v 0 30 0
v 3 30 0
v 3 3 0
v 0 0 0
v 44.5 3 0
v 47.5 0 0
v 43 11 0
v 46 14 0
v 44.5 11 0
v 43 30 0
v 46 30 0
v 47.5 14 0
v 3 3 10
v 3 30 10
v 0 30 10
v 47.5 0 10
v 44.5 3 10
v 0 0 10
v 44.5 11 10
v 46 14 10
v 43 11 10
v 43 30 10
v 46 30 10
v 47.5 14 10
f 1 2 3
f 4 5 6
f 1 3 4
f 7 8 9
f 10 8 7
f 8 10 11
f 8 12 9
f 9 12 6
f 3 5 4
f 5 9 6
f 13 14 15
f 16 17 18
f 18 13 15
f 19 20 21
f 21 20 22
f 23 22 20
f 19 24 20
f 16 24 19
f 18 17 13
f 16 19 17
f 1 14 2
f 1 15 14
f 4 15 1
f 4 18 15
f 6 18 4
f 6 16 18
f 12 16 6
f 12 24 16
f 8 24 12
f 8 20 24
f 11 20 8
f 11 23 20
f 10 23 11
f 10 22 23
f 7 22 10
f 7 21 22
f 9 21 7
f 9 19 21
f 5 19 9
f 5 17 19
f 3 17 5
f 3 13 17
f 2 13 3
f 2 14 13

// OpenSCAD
door_thickness = 40;
length = 30;
thickness = 3;
tie_thickness = 1.5;
tie_width = 8;

linear_extrude(10)
difference() {
    union() {
        square([thickness*2+door_thickness, length]);
        #translate([thickness+door_thickness+tie_thickness,0])
        square([thickness, tie_width+thickness*2]);
    }
    translate([thickness,thickness])
    square([door_thickness, length]);
    
    translate([thickness+door_thickness,thickness])
    square([tie_thickness, tie_width]);
}
